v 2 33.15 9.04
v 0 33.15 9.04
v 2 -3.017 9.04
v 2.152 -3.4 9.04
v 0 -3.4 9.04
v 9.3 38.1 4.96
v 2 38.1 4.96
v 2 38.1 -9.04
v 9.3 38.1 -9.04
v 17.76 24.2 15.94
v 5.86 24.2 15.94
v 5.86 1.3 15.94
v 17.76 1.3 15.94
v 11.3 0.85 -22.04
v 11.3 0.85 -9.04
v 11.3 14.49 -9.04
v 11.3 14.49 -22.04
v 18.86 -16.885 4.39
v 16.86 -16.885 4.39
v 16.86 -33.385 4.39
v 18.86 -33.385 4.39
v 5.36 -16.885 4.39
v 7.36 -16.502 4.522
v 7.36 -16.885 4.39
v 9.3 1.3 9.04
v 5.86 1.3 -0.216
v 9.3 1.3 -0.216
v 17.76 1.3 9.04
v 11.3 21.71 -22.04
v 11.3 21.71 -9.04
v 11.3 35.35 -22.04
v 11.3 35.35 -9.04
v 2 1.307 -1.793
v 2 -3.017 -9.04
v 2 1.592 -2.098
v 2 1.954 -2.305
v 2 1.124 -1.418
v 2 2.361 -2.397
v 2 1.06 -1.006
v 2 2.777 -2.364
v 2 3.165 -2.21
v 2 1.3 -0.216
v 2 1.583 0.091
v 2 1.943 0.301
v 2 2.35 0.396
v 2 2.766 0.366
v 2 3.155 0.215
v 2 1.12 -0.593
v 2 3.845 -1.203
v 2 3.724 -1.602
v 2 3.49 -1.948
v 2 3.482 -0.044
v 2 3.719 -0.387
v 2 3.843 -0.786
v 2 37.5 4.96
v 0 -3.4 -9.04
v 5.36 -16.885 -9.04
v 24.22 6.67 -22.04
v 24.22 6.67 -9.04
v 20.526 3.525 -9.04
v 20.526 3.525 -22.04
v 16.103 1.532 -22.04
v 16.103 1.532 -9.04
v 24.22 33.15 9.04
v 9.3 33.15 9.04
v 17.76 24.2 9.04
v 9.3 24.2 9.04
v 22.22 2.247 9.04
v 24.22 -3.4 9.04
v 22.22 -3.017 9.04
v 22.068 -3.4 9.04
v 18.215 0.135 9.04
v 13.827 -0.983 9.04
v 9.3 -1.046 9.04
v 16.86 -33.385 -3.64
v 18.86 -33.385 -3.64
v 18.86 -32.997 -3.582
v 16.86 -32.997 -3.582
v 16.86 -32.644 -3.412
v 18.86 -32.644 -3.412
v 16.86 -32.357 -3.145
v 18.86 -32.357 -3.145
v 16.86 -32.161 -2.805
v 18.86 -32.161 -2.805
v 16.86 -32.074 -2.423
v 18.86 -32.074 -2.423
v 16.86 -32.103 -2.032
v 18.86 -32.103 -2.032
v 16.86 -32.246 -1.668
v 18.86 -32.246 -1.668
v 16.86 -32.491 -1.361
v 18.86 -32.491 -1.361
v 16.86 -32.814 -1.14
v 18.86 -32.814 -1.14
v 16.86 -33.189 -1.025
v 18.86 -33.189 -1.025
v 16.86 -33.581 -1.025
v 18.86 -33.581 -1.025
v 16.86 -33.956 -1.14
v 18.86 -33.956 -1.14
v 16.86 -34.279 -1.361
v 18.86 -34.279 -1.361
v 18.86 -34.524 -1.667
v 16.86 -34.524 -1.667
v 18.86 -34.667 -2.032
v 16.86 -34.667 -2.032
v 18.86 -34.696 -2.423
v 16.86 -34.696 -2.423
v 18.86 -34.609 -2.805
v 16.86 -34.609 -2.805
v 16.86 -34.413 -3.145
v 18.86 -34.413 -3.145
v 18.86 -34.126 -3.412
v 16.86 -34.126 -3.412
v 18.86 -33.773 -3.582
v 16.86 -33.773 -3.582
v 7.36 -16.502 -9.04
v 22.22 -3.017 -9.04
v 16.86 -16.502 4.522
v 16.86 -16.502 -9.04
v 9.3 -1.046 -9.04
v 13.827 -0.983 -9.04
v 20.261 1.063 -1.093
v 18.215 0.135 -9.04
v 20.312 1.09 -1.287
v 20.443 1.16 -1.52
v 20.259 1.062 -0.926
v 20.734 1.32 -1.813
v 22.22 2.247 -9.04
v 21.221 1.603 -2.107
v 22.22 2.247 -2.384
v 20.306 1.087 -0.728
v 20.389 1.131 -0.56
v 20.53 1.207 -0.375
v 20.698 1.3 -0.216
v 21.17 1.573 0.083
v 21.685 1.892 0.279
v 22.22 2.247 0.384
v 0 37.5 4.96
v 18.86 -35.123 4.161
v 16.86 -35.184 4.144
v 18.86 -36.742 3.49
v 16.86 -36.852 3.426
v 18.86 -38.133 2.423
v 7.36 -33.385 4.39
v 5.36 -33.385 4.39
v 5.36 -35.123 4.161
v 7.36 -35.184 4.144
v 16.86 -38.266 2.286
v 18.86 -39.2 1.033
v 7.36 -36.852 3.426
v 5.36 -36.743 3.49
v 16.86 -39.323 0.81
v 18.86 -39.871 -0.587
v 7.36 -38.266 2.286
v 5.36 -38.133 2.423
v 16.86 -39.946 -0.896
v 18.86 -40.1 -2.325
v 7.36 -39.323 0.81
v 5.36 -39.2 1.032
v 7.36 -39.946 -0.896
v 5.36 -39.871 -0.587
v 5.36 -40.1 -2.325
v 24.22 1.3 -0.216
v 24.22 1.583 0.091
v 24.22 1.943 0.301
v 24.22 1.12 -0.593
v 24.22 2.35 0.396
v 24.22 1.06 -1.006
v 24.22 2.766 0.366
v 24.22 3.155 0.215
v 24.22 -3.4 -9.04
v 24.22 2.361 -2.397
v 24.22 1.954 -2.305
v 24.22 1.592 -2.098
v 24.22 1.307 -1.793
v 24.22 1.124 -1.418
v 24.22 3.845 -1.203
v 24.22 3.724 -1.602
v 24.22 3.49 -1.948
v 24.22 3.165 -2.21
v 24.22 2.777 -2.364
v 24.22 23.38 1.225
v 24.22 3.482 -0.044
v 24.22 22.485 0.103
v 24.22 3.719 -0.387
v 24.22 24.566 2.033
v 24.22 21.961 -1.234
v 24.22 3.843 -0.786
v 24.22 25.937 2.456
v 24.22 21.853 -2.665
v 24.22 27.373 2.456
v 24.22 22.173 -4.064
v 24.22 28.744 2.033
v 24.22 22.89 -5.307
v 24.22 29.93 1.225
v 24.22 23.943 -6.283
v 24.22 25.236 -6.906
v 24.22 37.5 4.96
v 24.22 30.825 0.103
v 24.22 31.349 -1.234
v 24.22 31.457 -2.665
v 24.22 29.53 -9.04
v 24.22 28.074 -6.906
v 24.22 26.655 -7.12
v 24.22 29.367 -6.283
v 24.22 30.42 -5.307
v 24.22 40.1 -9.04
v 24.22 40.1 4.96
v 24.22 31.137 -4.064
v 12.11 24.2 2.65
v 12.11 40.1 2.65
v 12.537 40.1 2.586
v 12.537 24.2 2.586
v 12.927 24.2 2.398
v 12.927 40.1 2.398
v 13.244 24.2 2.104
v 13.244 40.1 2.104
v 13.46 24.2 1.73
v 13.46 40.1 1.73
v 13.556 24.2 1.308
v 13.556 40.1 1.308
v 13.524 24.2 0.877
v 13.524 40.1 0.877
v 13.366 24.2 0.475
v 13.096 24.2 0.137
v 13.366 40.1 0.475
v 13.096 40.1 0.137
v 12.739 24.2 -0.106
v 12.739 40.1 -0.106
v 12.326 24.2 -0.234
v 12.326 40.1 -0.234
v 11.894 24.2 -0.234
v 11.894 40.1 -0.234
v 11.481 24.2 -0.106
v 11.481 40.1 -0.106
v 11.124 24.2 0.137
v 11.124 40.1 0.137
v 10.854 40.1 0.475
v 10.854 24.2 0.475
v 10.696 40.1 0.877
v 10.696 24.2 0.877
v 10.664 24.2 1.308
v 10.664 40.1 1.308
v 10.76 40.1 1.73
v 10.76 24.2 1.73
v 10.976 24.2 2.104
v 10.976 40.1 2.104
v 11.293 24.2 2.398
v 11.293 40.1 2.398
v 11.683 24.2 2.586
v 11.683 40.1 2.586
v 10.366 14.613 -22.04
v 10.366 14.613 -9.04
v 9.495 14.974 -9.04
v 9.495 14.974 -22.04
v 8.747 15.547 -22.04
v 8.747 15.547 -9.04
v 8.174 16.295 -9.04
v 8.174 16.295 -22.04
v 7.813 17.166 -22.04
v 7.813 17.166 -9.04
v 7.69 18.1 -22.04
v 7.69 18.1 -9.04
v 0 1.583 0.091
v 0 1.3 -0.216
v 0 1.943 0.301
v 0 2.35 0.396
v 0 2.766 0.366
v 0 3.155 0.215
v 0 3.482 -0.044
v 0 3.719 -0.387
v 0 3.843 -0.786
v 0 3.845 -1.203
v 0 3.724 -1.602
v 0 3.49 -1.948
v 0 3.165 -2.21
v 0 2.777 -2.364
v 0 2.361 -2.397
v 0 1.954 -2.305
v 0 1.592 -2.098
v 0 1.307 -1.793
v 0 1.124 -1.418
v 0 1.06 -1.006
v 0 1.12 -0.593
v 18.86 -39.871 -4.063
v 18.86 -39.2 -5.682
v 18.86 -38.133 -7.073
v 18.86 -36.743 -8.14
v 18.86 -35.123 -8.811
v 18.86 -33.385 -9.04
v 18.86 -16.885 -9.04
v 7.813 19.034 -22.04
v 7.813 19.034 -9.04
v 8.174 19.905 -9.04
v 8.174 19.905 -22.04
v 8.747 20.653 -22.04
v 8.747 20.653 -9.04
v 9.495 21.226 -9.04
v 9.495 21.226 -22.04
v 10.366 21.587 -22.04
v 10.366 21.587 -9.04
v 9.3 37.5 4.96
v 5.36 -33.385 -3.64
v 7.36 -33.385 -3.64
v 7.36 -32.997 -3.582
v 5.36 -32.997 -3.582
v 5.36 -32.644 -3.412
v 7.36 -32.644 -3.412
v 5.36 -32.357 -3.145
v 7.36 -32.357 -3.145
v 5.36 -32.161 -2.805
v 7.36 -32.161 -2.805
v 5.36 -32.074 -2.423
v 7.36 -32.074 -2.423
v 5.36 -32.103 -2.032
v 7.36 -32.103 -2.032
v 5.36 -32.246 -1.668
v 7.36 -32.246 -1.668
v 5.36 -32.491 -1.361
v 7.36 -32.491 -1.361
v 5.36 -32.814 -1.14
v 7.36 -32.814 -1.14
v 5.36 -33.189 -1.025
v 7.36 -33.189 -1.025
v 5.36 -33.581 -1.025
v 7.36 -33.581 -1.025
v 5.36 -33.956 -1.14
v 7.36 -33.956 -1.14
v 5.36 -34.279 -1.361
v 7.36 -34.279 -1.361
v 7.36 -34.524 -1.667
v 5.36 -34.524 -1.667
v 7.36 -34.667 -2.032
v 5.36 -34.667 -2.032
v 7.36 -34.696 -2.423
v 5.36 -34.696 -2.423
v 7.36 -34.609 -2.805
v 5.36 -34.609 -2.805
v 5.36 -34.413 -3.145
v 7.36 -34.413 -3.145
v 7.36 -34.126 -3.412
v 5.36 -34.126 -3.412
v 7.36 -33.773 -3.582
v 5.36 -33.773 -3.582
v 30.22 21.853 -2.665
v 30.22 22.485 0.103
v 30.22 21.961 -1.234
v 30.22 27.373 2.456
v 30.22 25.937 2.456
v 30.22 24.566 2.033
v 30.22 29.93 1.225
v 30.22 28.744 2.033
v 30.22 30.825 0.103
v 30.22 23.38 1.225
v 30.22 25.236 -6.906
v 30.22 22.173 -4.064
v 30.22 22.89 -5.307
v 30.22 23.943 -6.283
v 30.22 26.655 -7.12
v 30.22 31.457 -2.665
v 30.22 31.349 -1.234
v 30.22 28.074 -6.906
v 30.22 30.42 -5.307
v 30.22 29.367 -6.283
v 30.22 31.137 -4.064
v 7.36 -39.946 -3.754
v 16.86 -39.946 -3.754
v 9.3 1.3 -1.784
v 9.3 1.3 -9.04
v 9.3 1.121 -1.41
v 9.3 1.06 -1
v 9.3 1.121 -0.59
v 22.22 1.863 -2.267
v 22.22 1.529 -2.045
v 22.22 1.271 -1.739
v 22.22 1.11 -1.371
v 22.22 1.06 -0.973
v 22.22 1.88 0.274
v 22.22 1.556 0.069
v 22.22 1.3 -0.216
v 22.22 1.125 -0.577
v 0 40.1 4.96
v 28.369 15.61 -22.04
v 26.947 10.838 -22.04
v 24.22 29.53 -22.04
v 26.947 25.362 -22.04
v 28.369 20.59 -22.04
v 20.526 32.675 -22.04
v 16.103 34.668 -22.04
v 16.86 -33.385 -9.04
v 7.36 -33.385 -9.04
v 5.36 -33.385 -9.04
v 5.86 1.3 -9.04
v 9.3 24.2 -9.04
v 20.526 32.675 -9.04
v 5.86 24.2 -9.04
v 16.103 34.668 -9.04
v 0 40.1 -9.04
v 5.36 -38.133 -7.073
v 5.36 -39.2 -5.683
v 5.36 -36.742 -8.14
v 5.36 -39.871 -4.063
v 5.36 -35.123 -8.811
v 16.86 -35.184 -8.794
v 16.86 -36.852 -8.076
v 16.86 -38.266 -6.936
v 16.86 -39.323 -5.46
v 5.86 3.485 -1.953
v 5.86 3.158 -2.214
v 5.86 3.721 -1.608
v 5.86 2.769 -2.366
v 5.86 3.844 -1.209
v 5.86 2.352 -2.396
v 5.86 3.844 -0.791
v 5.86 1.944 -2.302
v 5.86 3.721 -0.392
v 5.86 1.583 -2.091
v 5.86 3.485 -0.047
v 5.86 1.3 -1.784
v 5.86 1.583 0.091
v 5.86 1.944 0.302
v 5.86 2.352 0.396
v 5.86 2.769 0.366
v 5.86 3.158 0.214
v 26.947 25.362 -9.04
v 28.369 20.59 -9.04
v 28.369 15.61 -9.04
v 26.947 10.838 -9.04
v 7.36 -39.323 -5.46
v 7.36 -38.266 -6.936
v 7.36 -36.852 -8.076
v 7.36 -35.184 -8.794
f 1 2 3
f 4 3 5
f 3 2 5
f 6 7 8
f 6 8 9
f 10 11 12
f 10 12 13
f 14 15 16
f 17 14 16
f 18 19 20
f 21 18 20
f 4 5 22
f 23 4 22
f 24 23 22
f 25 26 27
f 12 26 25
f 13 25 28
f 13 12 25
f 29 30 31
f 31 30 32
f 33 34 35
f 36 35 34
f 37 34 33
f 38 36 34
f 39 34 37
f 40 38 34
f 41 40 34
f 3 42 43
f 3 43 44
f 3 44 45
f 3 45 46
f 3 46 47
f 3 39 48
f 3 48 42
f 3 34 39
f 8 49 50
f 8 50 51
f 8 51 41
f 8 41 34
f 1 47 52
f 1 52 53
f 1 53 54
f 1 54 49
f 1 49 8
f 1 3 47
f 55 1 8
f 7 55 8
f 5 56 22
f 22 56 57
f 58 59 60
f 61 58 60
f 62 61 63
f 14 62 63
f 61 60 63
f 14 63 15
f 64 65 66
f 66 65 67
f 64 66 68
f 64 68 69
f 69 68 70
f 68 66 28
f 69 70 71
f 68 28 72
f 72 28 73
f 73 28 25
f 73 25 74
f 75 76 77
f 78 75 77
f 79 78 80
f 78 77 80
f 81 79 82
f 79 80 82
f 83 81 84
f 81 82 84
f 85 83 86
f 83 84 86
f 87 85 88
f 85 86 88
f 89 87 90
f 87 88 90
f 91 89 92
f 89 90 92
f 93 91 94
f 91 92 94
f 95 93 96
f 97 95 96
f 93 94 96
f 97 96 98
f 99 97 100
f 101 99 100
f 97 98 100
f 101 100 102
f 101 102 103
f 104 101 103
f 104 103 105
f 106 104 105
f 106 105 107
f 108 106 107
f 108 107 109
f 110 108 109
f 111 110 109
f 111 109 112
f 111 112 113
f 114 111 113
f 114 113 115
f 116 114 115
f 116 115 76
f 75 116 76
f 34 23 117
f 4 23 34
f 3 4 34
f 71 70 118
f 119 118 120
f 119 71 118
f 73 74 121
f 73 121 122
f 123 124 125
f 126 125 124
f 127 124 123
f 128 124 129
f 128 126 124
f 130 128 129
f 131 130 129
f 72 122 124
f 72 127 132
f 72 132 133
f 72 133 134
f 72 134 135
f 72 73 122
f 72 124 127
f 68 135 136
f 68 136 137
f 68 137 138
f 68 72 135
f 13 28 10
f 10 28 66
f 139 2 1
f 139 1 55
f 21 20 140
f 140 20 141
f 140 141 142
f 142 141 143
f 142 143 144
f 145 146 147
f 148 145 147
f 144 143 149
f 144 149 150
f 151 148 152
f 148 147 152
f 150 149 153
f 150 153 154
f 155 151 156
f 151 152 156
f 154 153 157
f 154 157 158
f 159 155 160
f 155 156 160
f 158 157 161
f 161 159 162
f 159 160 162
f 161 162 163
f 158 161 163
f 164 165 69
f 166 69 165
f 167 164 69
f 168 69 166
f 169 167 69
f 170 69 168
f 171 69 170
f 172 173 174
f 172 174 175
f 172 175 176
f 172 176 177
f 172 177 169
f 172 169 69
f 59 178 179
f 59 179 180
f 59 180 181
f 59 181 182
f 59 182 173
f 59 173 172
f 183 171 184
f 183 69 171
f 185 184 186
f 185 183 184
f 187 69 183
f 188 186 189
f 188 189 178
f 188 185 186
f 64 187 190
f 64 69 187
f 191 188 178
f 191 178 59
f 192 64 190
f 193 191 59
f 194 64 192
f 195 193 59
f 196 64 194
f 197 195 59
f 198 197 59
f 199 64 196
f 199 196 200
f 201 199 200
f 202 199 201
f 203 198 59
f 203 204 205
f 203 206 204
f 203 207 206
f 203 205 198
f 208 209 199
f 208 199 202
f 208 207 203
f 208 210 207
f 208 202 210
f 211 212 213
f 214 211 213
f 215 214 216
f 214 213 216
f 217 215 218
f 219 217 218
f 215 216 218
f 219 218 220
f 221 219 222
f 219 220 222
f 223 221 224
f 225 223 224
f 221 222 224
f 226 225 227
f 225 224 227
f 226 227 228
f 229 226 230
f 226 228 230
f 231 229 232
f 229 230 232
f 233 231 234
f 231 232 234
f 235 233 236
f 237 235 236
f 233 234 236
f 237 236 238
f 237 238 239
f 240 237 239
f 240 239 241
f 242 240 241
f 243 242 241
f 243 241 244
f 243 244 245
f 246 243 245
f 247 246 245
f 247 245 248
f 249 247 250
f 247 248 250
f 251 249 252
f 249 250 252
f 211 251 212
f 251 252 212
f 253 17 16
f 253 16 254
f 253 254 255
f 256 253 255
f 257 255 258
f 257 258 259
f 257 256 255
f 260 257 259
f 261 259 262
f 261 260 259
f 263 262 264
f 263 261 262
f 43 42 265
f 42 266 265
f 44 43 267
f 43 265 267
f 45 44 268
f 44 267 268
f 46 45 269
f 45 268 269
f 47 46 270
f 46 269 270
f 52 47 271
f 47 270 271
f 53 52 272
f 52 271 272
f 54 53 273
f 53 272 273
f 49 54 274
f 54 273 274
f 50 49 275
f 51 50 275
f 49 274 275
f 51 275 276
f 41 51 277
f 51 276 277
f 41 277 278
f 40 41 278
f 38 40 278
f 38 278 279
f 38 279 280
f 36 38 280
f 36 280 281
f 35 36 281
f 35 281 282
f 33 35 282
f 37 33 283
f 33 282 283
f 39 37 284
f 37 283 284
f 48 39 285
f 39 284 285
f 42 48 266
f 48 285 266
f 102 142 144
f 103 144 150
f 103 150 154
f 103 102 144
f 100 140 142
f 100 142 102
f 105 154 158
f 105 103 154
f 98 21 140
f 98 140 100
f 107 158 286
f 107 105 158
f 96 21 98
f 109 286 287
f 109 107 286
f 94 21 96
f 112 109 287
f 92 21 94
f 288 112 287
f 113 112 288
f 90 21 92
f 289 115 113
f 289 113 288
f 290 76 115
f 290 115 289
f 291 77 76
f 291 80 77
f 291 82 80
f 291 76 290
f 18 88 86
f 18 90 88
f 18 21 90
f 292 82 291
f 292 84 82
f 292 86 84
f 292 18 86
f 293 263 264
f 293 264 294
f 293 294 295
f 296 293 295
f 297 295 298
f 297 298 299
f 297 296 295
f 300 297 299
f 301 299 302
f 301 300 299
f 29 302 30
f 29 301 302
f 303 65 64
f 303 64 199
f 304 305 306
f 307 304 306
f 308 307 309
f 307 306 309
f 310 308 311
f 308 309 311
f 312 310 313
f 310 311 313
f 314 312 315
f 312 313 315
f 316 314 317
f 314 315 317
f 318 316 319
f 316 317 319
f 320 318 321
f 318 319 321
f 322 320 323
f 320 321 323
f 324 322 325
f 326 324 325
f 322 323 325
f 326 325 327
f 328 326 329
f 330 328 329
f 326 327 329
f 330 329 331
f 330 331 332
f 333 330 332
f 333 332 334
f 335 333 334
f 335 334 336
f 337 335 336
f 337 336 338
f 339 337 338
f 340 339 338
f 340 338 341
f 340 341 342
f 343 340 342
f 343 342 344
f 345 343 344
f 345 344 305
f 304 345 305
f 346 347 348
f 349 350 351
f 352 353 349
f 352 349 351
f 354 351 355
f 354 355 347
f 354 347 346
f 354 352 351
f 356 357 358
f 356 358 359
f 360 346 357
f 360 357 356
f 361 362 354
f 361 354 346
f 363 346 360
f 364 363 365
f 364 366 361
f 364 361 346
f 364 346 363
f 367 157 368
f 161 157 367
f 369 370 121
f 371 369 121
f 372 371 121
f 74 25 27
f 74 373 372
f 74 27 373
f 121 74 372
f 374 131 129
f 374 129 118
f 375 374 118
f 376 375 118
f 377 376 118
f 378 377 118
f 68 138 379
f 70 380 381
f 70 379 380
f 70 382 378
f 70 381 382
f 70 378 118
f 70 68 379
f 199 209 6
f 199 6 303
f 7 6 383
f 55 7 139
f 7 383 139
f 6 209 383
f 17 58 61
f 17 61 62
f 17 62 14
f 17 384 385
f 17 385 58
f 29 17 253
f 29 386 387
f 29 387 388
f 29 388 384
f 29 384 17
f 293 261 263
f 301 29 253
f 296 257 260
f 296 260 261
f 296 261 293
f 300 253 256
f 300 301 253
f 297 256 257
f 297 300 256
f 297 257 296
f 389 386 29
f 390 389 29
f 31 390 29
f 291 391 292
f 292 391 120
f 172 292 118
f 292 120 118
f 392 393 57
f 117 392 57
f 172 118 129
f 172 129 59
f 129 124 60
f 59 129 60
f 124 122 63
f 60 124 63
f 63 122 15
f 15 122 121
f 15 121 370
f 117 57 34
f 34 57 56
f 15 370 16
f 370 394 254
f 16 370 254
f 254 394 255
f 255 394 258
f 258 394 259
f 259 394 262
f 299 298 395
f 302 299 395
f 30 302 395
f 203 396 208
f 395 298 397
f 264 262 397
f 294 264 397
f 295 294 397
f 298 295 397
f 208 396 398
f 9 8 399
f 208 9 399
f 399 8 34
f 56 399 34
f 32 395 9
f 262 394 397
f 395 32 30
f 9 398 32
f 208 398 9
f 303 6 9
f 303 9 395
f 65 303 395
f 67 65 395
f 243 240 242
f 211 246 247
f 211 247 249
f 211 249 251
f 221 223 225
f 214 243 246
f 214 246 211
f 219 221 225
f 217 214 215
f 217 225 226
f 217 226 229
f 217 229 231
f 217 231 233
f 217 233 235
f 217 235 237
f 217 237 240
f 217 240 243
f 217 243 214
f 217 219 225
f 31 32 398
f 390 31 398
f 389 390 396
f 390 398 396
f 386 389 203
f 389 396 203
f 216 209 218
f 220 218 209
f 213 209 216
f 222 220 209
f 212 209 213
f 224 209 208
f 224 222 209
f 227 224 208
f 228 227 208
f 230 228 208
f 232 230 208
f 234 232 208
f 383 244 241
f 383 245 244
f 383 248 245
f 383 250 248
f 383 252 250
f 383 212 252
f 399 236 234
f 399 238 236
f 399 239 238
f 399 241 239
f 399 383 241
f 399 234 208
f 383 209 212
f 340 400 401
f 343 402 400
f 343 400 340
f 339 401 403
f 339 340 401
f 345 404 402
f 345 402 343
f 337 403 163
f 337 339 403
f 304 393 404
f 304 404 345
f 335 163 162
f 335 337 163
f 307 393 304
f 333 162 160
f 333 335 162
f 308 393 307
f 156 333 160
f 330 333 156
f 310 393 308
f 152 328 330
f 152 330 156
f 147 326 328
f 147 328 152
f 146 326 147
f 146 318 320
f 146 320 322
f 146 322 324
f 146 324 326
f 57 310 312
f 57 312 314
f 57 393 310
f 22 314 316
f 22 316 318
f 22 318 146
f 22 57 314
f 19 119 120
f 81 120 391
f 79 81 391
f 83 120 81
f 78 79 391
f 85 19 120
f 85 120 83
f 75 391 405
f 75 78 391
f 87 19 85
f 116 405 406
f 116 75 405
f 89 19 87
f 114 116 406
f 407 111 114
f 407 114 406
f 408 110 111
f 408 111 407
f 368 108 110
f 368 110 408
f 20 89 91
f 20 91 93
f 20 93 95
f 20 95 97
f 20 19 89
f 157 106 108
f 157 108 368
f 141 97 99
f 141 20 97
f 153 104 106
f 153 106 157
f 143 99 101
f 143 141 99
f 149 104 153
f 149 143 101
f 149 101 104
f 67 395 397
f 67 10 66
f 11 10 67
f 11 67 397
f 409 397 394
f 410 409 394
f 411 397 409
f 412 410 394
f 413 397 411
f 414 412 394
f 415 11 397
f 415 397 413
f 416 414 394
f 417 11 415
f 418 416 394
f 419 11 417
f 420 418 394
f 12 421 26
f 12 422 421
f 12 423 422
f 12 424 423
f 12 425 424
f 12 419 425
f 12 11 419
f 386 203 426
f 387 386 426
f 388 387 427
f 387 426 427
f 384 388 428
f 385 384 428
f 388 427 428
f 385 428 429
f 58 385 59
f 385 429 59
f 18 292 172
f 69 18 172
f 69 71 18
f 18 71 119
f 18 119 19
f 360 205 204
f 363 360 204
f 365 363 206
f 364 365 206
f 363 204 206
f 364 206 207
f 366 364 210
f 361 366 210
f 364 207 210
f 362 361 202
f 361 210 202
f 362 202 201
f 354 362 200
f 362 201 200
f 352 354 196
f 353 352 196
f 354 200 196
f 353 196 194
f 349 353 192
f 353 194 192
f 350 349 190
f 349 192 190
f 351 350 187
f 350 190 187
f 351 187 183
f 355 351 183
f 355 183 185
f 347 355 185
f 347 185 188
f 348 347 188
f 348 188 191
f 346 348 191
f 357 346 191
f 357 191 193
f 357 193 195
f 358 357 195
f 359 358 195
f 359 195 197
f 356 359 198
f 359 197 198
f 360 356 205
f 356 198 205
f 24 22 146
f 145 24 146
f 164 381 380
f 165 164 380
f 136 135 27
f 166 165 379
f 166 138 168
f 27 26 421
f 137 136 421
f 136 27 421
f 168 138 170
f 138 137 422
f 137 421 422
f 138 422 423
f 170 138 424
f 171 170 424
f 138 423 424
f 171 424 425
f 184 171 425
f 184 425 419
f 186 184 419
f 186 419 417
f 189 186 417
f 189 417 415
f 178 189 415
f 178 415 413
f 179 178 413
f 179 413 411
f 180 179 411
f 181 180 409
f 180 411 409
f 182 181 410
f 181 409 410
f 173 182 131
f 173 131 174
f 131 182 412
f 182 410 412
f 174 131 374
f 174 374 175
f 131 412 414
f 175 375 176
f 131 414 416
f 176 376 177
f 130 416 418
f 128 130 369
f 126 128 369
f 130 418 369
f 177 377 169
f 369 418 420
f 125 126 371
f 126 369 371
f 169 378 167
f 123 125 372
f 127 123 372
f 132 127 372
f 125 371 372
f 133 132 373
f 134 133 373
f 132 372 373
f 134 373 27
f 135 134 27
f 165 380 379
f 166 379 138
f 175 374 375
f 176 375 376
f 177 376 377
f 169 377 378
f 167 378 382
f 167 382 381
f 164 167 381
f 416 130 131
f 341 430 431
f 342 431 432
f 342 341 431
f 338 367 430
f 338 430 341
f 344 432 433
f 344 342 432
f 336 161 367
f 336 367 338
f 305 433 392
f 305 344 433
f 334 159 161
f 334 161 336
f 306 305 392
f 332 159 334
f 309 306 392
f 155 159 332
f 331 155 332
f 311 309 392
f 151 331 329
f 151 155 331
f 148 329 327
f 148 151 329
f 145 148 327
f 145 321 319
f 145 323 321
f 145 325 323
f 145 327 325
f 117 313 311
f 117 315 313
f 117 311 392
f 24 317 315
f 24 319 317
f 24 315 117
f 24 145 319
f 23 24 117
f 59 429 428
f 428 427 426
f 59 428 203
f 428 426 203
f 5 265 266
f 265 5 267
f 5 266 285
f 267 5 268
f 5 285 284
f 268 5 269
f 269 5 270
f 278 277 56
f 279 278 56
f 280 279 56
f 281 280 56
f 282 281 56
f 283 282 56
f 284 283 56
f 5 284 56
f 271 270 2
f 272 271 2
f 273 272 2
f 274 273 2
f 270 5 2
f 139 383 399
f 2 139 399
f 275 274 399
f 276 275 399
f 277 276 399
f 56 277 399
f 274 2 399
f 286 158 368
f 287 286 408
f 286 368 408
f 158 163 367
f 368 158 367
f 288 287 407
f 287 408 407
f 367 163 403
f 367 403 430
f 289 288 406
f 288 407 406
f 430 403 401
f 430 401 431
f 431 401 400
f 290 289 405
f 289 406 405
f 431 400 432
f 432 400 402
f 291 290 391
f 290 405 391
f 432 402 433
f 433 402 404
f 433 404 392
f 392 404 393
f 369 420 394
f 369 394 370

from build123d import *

# Parameters (mm, degrees)
SKETCH_1_W          = 14
SKETCH_1_H          = 2.6
EXTRUDE_1_DEPTH     = 24.22
CUT_EXTRUDE_START   = -5.36
CUT_EXTRUDE_1_DEPTH = 5.36
CUT_EXTRUDE_2_DEPTH = 5.36
CUT_EXTRUDE_3_DEPTH = 51.214587522
SKETCH_6_R          = 4.815
EXTRUDE_3_DEPTH     = 6
EXTRUDE_4_DEPTH     = 13
SKETCH_10_W         = 11.9
SKETCH_10_H         = 22.9
EXTRUDE_5_DEPTH     = 6.9
CUT_EXTRUDE_START_2 = -18.08
CUT_EXTRUDE_4_DEPTH = 18.08
SKETCH_12_R         = 1.315
CUT_EXTRUDE_5_DEPTH = 50.492132708
SKETCH_13_R         = 1.4
CUT_EXTRUDE_6_DEPTH = 55.836301845
SKETCH_14_R         = 1.45
CUT_EXTRUDE_7_DEPTH = 15.9
EXTRUDE_6_DEPTH     = 13


# Read off the part's stored shape, not the designer's step: 切除-拉伸4
with BuildPart() as part:
    # 草图1 → 凸台-拉伸1 (new body)
    with BuildSketch(Plane(origin=(0, 0, 0), x_dir=(0, 0, -1), z_dir=(1, 0, 0))):
        with Locations((2.04, 38.8)):
            Rectangle(SKETCH_1_W, SKETCH_1_H)
        Polygon((-9.04, 33.15), (-9.04, -3.4), (9.04, -3.4), (9.04, 37.5), (-4.96, 37.5), (-4.96, 33.15), align=None)
        Polygon((-4.96, 33.15), (-9.04, 33.15), (-4.96, 37.5), align=None)
        Polygon((9.04, -3.4), (-9.04, -3.4), (-4.39, -16.885), (9.04, -16.885), align=None)
        with BuildLine():
            Line((9.04, -16.885), (-4.39, -16.885))
            Line((-4.39, -16.885), (-4.39, -33.385))
            ThreePointArc((-4.39, -33.385), (2.325, -26.67), (9.04, -33.385))
            Line((9.04, -33.385), (9.04, -16.885))
        make_face()
        with BuildLine():
            ThreePointArc((9.04, -33.385), (2.325, -26.67), (-4.39, -33.385))
            Line((-4.39, -33.385), (9.04, -33.385))
        make_face()
        with BuildLine():
            Line((9.04, -33.385), (-4.39, -33.385))
            ThreePointArc((-4.39, -33.385), (-2.423222036, -38.133222036), (2.325, -40.1))
            ThreePointArc((2.325, -40.1), (7.073222036, -38.133222036), (9.04, -33.385))
        make_face()
        with BuildLine():
            ThreePointArc((9.04, -33.385), (2.325, -26.67), (-4.39, -33.385))
            Line((-4.39, -33.385), (9.04, -33.385))
        make_face()
        with BuildLine():
            Line((9.04, -33.385), (-4.39, -33.385))
            ThreePointArc((-4.39, -33.385), (-2.423222036, -38.133222036), (2.325, -40.1))
            ThreePointArc((2.325, -40.1), (7.073222036, -38.133222036), (9.04, -33.385))
        make_face()
    extrude(amount=EXTRUDE_1_DEPTH)

    # 草图2 → 切除-拉伸1 (cut)
    with BuildSketch(Plane(origin=(24.22, 0, 0), x_dir=(0, 0, -1), z_dir=(1, 0, 0)).offset(CUT_EXTRUDE_START)):
        with BuildLine():
            Line((9.04, -33.385), (9.04, -16.885))
            Line((9.04, -16.885), (-4.39, -16.885))
            Line((-4.39, -16.885), (-4.39, -33.385))
            ThreePointArc((-4.39, -33.385), (2.325, -40.1), (9.04, -33.385))
        make_face()
    extrude(amount=CUT_EXTRUDE_1_DEPTH, mode=Mode.SUBTRACT)

    # 草图3 → 切除-拉伸2 (cut)
    with BuildSketch(Plane.ZY):
        with BuildLine():
            Line((4.39, -16.885), (-9.04, -16.885))
            Line((-9.04, -16.885), (-9.04, -33.385))
            ThreePointArc((-9.04, -33.385), (-2.325, -40.1), (4.39, -33.385))
            Line((4.39, -33.385), (4.39, -16.885))
        make_face()
    extrude(amount=-CUT_EXTRUDE_2_DEPTH, mode=Mode.SUBTRACT)

    # 草图4 → 切除-拉伸3 (cut, through all)
    with BuildSketch(Plane(origin=(0, 0, -9.04), x_dir=(-1, 0, 0), z_dir=(0, 0, -1))):
        Polygon((-18.86, -16.885), (-24.22, -3.4), (-24.22, -16.885), align=None)
        Polygon((0, -16.885), (0, -3.4), (-5.36, -16.885), align=None)
    extrude(amount=-CUT_EXTRUDE_3_DEPTH, mode=Mode.SUBTRACT)

    # 草图6 → 凸台-拉伸3 (add)
    with BuildSketch(Plane(origin=(24.22, 0, 0), x_dir=(0, 0, -1), z_dir=(1, 0, 0))):
        with Locations((2.305, 26.655)):
            Circle(SKETCH_6_R)
    extrude(amount=EXTRUDE_3_DEPTH)

    # 草图8 → 凸台-拉伸4 (add)
    with BuildSketch(Plane(origin=(0, 0, -9.04), x_dir=(-1, 0, 0), z_dir=(0, 0, -1))):
        with BuildLine():
            Line((-11.3, 0.85), (-11.3, 18.1))
            Line((-11.3, 18.1), (-11.3, 35.35))
            ThreePointArc((-11.3, 35.35), (-18.385253719, 33.827736002), (-24.22, 29.529615042))
            Line((-24.22, 29.529615042), (-24.22, 6.670384958))
            ThreePointArc((-24.22, 6.670384958), (-18.385253719, 2.372263998), (-11.3, 0.85))
        make_face()
        with BuildLine():
            Line((-24.22, 6.670384958), (-24.22, 29.529615042))
            ThreePointArc((-24.22, 29.529615042), (-28.55, 18.1), (-24.22, 6.670384958))
        make_face()
    extrude(amount=EXTRUDE_4_DEPTH)

    # 草图10 → 凸台-拉伸5 (add)
    with BuildSketch(Plane.XY.offset(9.04)):
        with Locations((11.81, 12.75)):
            Rectangle(SKETCH_10_W, SKETCH_10_H)
    extrude(amount=EXTRUDE_5_DEPTH)

    # 切除-拉伸4 outline → 切除-拉伸4 (cut)
    with BuildSketch(Plane(origin=(0, 0, -9.04), x_dir=(-1, 0, 0), z_dir=(0, 0, -1)).offset(CUT_EXTRUDE_START_2)):
        with BuildLine():
            Line((-9.3, 24.2), (-5.86, 24.2))
            Line((-5.86, 24.2), (-5.86, 1.3))
            Line((-5.86, 1.3), (-9.3, 1.3))
            Line((-9.3, 1.3), (-9.3, -1.045821999))
            ThreePointArc((-9.3, -1.045821999), (-16.054192627, -0.553690049), (-22.22, 2.247047594))
            Line((-22.22, 2.247047594), (-22.22, -3.017090844))
            Line((-22.22, -3.017090844), (-16.86, -16.502090844))
            Line((-16.86, -16.502090844), (-16.86, -39.946221742))
            Line((-16.86, -39.946221742), (-7.36, -39.946221742))
            Line((-7.36, -39.946221742), (-7.36, -16.502090844))
            Line((-7.36, -16.502090844), (-2, -3.017090844))
            Line((-2, -3.017090844), (-2, 38.1))
            Line((-2, 38.1), (-9.3, 38.1))
            Line((-9.3, 38.1), (-9.3, 24.2))
        make_face()
    extrude(amount=CUT_EXTRUDE_4_DEPTH, mode=Mode.SUBTRACT)

    # 草图12 → 切除-拉伸5 (cut, through all)
    with BuildSketch(Plane(origin=(18.86, 0, 0), x_dir=(0, 0, -1), z_dir=(1, 0, 0))):
        with Locations((2.325, -33.385)):
            Circle(SKETCH_12_R)
    extrude(amount=-CUT_EXTRUDE_5_DEPTH, mode=Mode.SUBTRACT)

    # 草图13 → 切除-拉伸6 (cut, through all)
    with BuildSketch(Plane.ZY):
        with Locations(Location((-1, 2.46, 0), (0, 0, 304.04773237))):
            Circle(SKETCH_13_R)
    extrude(amount=-CUT_EXTRUDE_6_DEPTH, mode=Mode.SUBTRACT)

    # 草图14 → 切除-拉伸7 (cut)
    with BuildSketch(Plane(origin=(0, 40.1, 0), x_dir=(1, 0, 0), z_dir=(0, 1, 0))):
        with Locations(Location((12.11, -1.2, 0), (0, 0, 270))):
            Circle(SKETCH_14_R)
    extrude(amount=-CUT_EXTRUDE_7_DEPTH, mode=Mode.SUBTRACT)

    # 草图15 → 凸台-拉伸6 (add)
    with BuildSketch(Plane(origin=(0, 0, -22.04), x_dir=(-1, 0, 0), z_dir=(0, 0, -1))):
        with BuildLine():
            ThreePointArc((-11.3, 21.71), (-14.91, 18.1), (-11.3, 14.49))
            Line((-11.3, 14.49), (-11.3, 21.71))
        make_face()
        with BuildLine():
            Line((-11.3, 21.71), (-11.3, 14.49))
            ThreePointArc((-11.3, 14.49), (-8.74734452, 15.54734452), (-7.69, 18.1))
            ThreePointArc((-7.69, 18.1), (-8.74734452, 20.65265548), (-11.3, 21.71))
        make_face()
    extrude(amount=-EXTRUDE_6_DEPTH)


solid = part.part
